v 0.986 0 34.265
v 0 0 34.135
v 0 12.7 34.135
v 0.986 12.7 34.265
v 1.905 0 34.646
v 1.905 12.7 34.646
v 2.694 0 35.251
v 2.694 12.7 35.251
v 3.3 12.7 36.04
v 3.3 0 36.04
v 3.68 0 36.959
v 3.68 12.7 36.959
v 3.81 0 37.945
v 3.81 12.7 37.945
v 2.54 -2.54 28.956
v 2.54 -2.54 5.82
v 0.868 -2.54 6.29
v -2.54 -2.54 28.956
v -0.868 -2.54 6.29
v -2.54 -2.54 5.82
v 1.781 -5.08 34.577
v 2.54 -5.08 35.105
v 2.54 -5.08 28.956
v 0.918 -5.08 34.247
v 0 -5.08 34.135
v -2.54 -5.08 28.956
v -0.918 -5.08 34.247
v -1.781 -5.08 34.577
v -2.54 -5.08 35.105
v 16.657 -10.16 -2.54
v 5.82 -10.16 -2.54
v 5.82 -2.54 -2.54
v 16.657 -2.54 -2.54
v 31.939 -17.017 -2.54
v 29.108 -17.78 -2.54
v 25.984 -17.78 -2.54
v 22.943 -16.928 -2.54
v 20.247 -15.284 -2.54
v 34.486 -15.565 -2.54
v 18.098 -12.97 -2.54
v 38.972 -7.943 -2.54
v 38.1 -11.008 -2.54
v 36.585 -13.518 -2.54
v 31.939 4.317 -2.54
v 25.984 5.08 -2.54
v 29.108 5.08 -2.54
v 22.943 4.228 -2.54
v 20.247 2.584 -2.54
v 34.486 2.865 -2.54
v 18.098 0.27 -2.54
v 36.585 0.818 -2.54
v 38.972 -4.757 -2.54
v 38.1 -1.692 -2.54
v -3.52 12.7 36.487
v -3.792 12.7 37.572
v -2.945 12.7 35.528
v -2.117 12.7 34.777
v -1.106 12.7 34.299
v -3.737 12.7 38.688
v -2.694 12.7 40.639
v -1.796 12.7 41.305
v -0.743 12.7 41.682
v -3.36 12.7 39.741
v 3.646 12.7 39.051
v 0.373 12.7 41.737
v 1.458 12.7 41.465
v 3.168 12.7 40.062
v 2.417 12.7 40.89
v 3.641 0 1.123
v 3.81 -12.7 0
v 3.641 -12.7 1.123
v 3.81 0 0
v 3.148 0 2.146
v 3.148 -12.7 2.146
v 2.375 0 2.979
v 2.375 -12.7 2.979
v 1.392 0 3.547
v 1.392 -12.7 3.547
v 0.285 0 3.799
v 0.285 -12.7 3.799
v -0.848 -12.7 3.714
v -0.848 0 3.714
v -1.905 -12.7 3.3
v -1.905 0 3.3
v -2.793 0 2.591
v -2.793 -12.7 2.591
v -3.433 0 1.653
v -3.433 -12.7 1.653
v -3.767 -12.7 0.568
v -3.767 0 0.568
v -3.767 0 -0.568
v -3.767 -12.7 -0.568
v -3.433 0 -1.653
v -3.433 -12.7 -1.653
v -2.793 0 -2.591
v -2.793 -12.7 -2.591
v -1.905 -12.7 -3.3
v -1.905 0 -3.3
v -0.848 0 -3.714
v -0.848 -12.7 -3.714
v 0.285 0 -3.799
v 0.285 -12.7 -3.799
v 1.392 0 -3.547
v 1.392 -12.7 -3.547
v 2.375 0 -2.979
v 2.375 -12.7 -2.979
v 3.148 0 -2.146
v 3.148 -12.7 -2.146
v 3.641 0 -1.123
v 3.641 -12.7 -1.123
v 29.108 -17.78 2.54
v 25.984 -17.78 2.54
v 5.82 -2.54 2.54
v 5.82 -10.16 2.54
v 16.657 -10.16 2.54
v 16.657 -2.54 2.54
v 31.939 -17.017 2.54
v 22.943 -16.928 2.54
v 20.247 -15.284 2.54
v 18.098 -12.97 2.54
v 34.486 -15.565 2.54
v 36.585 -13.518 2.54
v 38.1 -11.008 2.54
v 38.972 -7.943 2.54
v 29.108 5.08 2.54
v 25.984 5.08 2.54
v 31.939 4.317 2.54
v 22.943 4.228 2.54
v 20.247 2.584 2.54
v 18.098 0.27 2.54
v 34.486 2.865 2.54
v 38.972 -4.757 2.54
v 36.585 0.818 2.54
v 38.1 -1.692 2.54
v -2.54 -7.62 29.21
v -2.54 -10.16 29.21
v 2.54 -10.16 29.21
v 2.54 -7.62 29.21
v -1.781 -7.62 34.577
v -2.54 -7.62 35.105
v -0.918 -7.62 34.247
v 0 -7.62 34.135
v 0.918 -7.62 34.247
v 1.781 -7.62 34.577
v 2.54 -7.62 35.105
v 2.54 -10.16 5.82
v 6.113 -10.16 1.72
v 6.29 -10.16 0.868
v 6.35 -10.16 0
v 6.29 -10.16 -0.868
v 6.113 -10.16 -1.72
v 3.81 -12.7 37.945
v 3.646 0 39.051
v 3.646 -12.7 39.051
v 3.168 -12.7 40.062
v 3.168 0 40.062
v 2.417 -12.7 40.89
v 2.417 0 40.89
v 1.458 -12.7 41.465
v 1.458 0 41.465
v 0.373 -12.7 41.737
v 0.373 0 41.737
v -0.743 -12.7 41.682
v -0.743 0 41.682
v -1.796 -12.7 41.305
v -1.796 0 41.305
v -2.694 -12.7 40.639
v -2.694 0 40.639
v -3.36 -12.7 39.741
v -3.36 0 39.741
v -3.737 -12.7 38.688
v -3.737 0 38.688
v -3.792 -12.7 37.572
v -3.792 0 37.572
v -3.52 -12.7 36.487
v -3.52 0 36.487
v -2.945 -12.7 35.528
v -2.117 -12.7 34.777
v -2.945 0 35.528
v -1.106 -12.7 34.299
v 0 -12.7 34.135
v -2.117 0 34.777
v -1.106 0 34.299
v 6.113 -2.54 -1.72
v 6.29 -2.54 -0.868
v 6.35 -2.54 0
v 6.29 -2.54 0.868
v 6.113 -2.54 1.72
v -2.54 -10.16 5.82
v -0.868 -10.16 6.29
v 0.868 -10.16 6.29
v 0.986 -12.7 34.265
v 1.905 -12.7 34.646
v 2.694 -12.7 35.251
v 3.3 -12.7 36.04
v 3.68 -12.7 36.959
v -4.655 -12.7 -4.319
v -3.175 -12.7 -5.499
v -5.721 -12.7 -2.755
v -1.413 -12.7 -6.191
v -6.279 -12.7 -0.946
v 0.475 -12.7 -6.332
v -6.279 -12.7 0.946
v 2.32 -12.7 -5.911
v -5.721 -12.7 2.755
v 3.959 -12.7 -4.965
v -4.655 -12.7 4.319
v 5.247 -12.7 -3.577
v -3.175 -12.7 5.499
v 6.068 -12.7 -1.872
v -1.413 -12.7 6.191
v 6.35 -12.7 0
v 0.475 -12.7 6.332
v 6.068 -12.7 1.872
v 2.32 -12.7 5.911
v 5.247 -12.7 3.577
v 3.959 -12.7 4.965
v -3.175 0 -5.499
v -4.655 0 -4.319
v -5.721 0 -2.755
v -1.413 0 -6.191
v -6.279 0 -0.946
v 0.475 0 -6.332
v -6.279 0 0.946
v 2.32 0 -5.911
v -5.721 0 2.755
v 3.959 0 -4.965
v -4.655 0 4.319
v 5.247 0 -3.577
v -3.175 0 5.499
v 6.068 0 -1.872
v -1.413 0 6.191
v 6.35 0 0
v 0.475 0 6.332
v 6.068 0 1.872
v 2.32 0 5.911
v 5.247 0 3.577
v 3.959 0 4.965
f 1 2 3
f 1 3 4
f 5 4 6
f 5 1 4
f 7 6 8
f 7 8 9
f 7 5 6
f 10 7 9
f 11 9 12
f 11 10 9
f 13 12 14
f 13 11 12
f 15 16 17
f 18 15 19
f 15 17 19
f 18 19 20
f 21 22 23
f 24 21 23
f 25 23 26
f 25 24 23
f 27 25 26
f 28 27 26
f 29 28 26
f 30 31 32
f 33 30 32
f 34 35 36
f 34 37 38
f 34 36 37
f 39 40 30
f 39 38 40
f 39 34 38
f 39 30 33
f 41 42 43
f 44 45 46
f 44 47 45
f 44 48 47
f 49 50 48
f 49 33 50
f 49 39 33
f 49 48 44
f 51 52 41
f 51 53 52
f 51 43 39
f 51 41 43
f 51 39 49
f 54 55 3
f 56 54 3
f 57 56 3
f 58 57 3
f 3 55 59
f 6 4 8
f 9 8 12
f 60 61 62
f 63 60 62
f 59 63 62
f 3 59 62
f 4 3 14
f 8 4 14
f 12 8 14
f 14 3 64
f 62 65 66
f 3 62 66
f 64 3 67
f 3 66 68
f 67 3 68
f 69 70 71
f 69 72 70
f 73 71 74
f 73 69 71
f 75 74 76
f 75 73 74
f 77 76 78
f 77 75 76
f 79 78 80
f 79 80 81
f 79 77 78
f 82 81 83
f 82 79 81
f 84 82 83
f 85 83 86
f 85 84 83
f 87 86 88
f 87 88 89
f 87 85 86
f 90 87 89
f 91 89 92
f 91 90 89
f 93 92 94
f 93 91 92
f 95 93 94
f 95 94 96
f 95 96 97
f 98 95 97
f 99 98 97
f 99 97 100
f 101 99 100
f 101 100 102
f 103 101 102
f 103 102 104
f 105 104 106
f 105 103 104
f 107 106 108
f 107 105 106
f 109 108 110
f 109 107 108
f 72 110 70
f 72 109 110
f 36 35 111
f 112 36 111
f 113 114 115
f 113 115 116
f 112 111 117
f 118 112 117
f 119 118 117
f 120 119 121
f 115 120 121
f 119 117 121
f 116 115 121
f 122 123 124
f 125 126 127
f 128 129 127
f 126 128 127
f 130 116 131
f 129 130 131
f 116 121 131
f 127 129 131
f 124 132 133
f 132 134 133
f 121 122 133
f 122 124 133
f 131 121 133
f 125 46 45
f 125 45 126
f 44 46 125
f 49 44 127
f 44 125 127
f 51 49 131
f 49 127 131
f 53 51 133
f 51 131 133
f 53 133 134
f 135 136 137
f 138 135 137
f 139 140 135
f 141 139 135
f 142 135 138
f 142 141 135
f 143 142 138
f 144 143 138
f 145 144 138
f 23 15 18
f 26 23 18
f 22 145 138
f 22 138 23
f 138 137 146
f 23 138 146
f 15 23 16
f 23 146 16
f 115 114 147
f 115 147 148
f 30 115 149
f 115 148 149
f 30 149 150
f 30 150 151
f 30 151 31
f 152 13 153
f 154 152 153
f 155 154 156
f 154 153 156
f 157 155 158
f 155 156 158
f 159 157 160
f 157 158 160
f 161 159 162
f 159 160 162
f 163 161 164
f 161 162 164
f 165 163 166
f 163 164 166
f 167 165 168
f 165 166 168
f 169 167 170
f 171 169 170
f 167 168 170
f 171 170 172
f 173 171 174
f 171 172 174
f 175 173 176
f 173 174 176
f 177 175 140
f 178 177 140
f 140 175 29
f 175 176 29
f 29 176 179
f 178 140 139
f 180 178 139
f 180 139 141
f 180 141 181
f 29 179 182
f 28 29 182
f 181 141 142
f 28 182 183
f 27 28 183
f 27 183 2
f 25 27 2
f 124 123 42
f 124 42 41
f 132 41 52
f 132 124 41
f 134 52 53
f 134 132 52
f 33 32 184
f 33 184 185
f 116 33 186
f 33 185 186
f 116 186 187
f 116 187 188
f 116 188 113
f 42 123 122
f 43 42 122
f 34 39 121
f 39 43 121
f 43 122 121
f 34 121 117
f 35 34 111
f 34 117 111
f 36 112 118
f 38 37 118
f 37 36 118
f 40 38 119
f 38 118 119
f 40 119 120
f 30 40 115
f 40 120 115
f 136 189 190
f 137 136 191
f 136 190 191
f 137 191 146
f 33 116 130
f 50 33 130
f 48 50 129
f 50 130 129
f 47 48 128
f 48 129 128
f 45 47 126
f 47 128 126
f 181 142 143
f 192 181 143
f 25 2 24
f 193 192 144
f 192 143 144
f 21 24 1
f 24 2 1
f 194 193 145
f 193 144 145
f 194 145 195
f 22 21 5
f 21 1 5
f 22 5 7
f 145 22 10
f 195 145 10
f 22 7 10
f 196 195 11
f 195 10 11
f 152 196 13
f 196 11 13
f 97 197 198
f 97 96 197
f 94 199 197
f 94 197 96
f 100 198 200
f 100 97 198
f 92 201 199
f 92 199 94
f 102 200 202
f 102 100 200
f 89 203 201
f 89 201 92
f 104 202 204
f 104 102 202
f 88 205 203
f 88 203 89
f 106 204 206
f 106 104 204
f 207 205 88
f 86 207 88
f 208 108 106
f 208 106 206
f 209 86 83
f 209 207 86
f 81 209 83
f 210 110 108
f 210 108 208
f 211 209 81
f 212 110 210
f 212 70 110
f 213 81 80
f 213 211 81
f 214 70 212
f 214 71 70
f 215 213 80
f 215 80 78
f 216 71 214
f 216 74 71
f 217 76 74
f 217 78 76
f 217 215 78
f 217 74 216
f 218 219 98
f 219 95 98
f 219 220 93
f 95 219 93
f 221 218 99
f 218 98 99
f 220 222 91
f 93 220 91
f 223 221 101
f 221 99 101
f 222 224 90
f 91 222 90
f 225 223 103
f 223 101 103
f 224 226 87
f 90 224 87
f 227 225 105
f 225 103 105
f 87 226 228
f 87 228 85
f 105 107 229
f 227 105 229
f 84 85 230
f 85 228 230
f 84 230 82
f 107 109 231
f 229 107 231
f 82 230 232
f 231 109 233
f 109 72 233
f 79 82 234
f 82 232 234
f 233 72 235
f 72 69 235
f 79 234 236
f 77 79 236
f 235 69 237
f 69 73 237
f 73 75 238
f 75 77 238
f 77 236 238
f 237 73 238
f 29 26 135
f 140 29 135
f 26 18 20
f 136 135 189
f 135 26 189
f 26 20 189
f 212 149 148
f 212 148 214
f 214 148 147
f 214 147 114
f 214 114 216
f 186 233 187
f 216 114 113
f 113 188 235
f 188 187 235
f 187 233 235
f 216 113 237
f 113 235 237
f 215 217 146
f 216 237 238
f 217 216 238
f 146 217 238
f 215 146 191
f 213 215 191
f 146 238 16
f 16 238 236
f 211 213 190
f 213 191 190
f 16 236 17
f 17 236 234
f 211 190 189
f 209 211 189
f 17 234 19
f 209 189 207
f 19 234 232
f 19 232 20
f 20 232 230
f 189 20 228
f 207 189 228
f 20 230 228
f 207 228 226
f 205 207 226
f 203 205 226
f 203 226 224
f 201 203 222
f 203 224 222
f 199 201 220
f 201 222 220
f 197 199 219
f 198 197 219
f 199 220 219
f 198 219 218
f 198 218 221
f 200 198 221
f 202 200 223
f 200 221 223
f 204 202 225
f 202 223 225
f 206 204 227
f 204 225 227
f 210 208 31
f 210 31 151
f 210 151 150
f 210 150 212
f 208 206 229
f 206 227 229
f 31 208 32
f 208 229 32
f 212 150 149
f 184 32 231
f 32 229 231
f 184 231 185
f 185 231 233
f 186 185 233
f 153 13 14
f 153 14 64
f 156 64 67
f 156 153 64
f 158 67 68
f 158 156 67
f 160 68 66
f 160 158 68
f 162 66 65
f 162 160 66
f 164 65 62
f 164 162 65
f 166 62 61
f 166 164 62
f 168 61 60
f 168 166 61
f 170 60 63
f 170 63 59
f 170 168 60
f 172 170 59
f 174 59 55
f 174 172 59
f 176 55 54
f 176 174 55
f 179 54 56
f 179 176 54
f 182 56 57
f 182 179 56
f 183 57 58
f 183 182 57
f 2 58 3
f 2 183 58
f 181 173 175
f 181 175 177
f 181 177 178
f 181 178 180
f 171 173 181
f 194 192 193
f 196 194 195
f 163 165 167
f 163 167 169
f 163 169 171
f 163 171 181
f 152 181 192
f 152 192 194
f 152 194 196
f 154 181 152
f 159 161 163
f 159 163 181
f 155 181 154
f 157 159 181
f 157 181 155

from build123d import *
from build123d import SkipClean  # not in build123d's __all__

# Parameters (mm, degrees)
F0_R           = 6.35
F0_R_2         = 3.81
F1_DEPTH       = 12.7
F4_DEPTH       = 38.1
F5_DEPTH       = 25.4
F5_DEPTH_BACK  = 25.4
F6_W           = 13.8230553448
F6_H           = 5.08
F7_DEPTH       = 7.62
F7_DEPTH_BACK  = 15.24
F8_DEPTH       = 7.62
F9_DEPTH       = 7.62
F11_DEPTH      = 25.4
F12_DEPTH      = 5.08
F14_DEPTH      = 38.1
F15_DEPTH      = 25.4
F16_W          = 2.54
F16_H          = 9.144
F17_DEPTH      = 2.54
F18_W          = 2.54
F18_H          = 8.89
F19_DEPTH      = 2.54
F21_DEPTH      = 12.7
F21_DEPTH_BACK = 12.7


with BuildPart() as f1:
    # F0 (on Front) → F1 (new body)
    with BuildSketch(Plane.XZ):
        Circle(F0_R)
        Circle(F0_R_2, mode=Mode.SUBTRACT)
    extrude(amount=F1_DEPTH)

    # F3 (on Right) → F4 (join)
    with BuildSketch(Plane.YZ):
        Polygon((-2.54, -2.54), (-2.54, 0), (-2.54, 2.54), (-10.16, 2.54), (-10.16, 0), (-10.16, -2.54), align=None)
    extrude(amount=F4_DEPTH)

    # F0 (on Front) → F5 (cut, two sides)
    with BuildSketch(Plane.XZ) as f5_sk:
        Circle(F0_R_2)
    extrude(amount=F5_DEPTH, mode=Mode.SUBTRACT)
    extrude(f5_sk.sketch, amount=-F5_DEPTH_BACK, mode=Mode.SUBTRACT)

    # F6 (on face) → F7 (join, two sides)
    with BuildSketch(Plane.XZ.offset(10.16)) as f7_sk:
        with Locations((31.1884723276, 0)):
            Rectangle(F6_W, F6_H)
    extrude(amount=F7_DEPTH)
    extrude(f7_sk.sketch, amount=-F7_DEPTH_BACK)

    # F8 (add): a face of the model
    f8_faces = [f1.faces().sort_by_distance(p)[0] for p in [
        (24.2769446552, -13.97, 0),
    ]]
    extrude(f8_faces, amount=F8_DEPTH)

    # F9 (add): a face of the model
    f9_faces = [f1.faces().sort_by_distance(p)[0] for p in [
        (24.2769446552, 1.27, 0),
    ]]
    extrude(f9_faces, amount=F9_DEPTH)

    # F10 (on face) → F11 (cut)
    with BuildSketch(Plane.XY.offset(2.54)):
        with BuildLine():
            ThreePointArc((25.9835010893, -17.78), (20.2469210754, -15.2836758241), (16.6569446552, -10.16))
            Line((16.6569446552, -10.16), (16.6569446552, -17.78))
            Line((16.6569446552, -17.78), (25.9835010893, -17.78))
        make_face()
        with BuildLine():
            Line((16.6569446552, 5.08), (16.6569446552, -2.54))
            ThreePointArc((16.6569446552, -2.54), (20.2469210754, 2.5836758241), (25.9835010893, 5.08))
            Line((25.9835010893, 5.08), (16.6569446552, 5.08))
        make_face()
        with BuildLine():
            Line((38.1, 5.08), (29.1083570088, 5.08))
            ThreePointArc((29.1083570088, 5.08), (34.4861831348, 2.8651480918), (38.1, -1.6919244863))
            Line((38.1, -1.6919244863), (38.1, 5.08))
        make_face()
        with BuildLine():
            Line((38.1, -17.78), (38.1, -11.0080755137))
            ThreePointArc((38.1, -11.0080755137), (34.4861831348, -15.5651480918), (29.1083570088, -17.78))
            Line((29.1083570088, -17.78), (38.1, -17.78))
        make_face()
    extrude(amount=-F11_DEPTH, mode=Mode.SUBTRACT)

    # F10 (on face) → F12 (join)
    with BuildSketch(Plane.XY.offset(2.54)):
        with BuildLine():
            ThreePointArc((38.1, -11.0080755137), (39.0822231303, -6.35), (38.1, -1.6919244863))
            Line((38.1, -1.6919244863), (38.1, -11.0080755137))
        make_face()
    with SkipClean():  # cleaning this boolean's faces spoils the solid; the shape is the same uncleaned
        extrude(amount=-F12_DEPTH)

    # F13 (on Top) → F14 (join)
    with BuildSketch(Plane.XY):
        Polygon((2.54, -2.54), (0, -2.54), (-2.54, -2.54), (-2.54, -10.16), (0, -10.16), (2.54, -10.16), align=None)
    extrude(amount=F14_DEPTH)

    # F0 (on Front) → F15 (cut)
    with BuildSketch(Plane.XZ):
        Circle(F0_R_2)
    extrude(amount=F15_DEPTH, mode=Mode.SUBTRACT)

    # F16 (on face) → F17 (cut)
    with BuildSketch(Plane(origin=(0, -2.54, 0), x_dir=(-1, 0, 0), z_dir=(0, 1, 0))):
        with Locations((-1.27, 33.528)):
            Rectangle(F16_W, F16_H)
        with Locations((1.27, 33.528)):
            Rectangle(F16_W, F16_H)
    extrude(amount=-F17_DEPTH, mode=Mode.SUBTRACT)

    # F18 (on face) → F19 (cut)
    with BuildSketch(Plane.XZ.offset(10.16)):
        with Locations((-1.27, 33.655)):
            Rectangle(F18_W, F18_H)
        with Locations((1.27, 33.655)):
            Rectangle(F18_W, F18_H)
    extrude(amount=-F19_DEPTH, mode=Mode.SUBTRACT)

    # F20 (on Front) → F21 (join, two sides)
    with BuildSketch(Plane.XZ) as f21_sk:
        with BuildLine():
            ThreePointArc((0, 34.1351066256), (2.6940768363, 35.2510297892), (3.81, 37.9451066256))
            ThreePointArc((3.81, 37.9451066256), (-2.6940768363, 40.6391834619), (0, 34.1351066256))
        make_face()
    extrude(amount=F21_DEPTH)
    extrude(f21_sk.sketch, amount=-F21_DEPTH_BACK)


solid = f1.part
